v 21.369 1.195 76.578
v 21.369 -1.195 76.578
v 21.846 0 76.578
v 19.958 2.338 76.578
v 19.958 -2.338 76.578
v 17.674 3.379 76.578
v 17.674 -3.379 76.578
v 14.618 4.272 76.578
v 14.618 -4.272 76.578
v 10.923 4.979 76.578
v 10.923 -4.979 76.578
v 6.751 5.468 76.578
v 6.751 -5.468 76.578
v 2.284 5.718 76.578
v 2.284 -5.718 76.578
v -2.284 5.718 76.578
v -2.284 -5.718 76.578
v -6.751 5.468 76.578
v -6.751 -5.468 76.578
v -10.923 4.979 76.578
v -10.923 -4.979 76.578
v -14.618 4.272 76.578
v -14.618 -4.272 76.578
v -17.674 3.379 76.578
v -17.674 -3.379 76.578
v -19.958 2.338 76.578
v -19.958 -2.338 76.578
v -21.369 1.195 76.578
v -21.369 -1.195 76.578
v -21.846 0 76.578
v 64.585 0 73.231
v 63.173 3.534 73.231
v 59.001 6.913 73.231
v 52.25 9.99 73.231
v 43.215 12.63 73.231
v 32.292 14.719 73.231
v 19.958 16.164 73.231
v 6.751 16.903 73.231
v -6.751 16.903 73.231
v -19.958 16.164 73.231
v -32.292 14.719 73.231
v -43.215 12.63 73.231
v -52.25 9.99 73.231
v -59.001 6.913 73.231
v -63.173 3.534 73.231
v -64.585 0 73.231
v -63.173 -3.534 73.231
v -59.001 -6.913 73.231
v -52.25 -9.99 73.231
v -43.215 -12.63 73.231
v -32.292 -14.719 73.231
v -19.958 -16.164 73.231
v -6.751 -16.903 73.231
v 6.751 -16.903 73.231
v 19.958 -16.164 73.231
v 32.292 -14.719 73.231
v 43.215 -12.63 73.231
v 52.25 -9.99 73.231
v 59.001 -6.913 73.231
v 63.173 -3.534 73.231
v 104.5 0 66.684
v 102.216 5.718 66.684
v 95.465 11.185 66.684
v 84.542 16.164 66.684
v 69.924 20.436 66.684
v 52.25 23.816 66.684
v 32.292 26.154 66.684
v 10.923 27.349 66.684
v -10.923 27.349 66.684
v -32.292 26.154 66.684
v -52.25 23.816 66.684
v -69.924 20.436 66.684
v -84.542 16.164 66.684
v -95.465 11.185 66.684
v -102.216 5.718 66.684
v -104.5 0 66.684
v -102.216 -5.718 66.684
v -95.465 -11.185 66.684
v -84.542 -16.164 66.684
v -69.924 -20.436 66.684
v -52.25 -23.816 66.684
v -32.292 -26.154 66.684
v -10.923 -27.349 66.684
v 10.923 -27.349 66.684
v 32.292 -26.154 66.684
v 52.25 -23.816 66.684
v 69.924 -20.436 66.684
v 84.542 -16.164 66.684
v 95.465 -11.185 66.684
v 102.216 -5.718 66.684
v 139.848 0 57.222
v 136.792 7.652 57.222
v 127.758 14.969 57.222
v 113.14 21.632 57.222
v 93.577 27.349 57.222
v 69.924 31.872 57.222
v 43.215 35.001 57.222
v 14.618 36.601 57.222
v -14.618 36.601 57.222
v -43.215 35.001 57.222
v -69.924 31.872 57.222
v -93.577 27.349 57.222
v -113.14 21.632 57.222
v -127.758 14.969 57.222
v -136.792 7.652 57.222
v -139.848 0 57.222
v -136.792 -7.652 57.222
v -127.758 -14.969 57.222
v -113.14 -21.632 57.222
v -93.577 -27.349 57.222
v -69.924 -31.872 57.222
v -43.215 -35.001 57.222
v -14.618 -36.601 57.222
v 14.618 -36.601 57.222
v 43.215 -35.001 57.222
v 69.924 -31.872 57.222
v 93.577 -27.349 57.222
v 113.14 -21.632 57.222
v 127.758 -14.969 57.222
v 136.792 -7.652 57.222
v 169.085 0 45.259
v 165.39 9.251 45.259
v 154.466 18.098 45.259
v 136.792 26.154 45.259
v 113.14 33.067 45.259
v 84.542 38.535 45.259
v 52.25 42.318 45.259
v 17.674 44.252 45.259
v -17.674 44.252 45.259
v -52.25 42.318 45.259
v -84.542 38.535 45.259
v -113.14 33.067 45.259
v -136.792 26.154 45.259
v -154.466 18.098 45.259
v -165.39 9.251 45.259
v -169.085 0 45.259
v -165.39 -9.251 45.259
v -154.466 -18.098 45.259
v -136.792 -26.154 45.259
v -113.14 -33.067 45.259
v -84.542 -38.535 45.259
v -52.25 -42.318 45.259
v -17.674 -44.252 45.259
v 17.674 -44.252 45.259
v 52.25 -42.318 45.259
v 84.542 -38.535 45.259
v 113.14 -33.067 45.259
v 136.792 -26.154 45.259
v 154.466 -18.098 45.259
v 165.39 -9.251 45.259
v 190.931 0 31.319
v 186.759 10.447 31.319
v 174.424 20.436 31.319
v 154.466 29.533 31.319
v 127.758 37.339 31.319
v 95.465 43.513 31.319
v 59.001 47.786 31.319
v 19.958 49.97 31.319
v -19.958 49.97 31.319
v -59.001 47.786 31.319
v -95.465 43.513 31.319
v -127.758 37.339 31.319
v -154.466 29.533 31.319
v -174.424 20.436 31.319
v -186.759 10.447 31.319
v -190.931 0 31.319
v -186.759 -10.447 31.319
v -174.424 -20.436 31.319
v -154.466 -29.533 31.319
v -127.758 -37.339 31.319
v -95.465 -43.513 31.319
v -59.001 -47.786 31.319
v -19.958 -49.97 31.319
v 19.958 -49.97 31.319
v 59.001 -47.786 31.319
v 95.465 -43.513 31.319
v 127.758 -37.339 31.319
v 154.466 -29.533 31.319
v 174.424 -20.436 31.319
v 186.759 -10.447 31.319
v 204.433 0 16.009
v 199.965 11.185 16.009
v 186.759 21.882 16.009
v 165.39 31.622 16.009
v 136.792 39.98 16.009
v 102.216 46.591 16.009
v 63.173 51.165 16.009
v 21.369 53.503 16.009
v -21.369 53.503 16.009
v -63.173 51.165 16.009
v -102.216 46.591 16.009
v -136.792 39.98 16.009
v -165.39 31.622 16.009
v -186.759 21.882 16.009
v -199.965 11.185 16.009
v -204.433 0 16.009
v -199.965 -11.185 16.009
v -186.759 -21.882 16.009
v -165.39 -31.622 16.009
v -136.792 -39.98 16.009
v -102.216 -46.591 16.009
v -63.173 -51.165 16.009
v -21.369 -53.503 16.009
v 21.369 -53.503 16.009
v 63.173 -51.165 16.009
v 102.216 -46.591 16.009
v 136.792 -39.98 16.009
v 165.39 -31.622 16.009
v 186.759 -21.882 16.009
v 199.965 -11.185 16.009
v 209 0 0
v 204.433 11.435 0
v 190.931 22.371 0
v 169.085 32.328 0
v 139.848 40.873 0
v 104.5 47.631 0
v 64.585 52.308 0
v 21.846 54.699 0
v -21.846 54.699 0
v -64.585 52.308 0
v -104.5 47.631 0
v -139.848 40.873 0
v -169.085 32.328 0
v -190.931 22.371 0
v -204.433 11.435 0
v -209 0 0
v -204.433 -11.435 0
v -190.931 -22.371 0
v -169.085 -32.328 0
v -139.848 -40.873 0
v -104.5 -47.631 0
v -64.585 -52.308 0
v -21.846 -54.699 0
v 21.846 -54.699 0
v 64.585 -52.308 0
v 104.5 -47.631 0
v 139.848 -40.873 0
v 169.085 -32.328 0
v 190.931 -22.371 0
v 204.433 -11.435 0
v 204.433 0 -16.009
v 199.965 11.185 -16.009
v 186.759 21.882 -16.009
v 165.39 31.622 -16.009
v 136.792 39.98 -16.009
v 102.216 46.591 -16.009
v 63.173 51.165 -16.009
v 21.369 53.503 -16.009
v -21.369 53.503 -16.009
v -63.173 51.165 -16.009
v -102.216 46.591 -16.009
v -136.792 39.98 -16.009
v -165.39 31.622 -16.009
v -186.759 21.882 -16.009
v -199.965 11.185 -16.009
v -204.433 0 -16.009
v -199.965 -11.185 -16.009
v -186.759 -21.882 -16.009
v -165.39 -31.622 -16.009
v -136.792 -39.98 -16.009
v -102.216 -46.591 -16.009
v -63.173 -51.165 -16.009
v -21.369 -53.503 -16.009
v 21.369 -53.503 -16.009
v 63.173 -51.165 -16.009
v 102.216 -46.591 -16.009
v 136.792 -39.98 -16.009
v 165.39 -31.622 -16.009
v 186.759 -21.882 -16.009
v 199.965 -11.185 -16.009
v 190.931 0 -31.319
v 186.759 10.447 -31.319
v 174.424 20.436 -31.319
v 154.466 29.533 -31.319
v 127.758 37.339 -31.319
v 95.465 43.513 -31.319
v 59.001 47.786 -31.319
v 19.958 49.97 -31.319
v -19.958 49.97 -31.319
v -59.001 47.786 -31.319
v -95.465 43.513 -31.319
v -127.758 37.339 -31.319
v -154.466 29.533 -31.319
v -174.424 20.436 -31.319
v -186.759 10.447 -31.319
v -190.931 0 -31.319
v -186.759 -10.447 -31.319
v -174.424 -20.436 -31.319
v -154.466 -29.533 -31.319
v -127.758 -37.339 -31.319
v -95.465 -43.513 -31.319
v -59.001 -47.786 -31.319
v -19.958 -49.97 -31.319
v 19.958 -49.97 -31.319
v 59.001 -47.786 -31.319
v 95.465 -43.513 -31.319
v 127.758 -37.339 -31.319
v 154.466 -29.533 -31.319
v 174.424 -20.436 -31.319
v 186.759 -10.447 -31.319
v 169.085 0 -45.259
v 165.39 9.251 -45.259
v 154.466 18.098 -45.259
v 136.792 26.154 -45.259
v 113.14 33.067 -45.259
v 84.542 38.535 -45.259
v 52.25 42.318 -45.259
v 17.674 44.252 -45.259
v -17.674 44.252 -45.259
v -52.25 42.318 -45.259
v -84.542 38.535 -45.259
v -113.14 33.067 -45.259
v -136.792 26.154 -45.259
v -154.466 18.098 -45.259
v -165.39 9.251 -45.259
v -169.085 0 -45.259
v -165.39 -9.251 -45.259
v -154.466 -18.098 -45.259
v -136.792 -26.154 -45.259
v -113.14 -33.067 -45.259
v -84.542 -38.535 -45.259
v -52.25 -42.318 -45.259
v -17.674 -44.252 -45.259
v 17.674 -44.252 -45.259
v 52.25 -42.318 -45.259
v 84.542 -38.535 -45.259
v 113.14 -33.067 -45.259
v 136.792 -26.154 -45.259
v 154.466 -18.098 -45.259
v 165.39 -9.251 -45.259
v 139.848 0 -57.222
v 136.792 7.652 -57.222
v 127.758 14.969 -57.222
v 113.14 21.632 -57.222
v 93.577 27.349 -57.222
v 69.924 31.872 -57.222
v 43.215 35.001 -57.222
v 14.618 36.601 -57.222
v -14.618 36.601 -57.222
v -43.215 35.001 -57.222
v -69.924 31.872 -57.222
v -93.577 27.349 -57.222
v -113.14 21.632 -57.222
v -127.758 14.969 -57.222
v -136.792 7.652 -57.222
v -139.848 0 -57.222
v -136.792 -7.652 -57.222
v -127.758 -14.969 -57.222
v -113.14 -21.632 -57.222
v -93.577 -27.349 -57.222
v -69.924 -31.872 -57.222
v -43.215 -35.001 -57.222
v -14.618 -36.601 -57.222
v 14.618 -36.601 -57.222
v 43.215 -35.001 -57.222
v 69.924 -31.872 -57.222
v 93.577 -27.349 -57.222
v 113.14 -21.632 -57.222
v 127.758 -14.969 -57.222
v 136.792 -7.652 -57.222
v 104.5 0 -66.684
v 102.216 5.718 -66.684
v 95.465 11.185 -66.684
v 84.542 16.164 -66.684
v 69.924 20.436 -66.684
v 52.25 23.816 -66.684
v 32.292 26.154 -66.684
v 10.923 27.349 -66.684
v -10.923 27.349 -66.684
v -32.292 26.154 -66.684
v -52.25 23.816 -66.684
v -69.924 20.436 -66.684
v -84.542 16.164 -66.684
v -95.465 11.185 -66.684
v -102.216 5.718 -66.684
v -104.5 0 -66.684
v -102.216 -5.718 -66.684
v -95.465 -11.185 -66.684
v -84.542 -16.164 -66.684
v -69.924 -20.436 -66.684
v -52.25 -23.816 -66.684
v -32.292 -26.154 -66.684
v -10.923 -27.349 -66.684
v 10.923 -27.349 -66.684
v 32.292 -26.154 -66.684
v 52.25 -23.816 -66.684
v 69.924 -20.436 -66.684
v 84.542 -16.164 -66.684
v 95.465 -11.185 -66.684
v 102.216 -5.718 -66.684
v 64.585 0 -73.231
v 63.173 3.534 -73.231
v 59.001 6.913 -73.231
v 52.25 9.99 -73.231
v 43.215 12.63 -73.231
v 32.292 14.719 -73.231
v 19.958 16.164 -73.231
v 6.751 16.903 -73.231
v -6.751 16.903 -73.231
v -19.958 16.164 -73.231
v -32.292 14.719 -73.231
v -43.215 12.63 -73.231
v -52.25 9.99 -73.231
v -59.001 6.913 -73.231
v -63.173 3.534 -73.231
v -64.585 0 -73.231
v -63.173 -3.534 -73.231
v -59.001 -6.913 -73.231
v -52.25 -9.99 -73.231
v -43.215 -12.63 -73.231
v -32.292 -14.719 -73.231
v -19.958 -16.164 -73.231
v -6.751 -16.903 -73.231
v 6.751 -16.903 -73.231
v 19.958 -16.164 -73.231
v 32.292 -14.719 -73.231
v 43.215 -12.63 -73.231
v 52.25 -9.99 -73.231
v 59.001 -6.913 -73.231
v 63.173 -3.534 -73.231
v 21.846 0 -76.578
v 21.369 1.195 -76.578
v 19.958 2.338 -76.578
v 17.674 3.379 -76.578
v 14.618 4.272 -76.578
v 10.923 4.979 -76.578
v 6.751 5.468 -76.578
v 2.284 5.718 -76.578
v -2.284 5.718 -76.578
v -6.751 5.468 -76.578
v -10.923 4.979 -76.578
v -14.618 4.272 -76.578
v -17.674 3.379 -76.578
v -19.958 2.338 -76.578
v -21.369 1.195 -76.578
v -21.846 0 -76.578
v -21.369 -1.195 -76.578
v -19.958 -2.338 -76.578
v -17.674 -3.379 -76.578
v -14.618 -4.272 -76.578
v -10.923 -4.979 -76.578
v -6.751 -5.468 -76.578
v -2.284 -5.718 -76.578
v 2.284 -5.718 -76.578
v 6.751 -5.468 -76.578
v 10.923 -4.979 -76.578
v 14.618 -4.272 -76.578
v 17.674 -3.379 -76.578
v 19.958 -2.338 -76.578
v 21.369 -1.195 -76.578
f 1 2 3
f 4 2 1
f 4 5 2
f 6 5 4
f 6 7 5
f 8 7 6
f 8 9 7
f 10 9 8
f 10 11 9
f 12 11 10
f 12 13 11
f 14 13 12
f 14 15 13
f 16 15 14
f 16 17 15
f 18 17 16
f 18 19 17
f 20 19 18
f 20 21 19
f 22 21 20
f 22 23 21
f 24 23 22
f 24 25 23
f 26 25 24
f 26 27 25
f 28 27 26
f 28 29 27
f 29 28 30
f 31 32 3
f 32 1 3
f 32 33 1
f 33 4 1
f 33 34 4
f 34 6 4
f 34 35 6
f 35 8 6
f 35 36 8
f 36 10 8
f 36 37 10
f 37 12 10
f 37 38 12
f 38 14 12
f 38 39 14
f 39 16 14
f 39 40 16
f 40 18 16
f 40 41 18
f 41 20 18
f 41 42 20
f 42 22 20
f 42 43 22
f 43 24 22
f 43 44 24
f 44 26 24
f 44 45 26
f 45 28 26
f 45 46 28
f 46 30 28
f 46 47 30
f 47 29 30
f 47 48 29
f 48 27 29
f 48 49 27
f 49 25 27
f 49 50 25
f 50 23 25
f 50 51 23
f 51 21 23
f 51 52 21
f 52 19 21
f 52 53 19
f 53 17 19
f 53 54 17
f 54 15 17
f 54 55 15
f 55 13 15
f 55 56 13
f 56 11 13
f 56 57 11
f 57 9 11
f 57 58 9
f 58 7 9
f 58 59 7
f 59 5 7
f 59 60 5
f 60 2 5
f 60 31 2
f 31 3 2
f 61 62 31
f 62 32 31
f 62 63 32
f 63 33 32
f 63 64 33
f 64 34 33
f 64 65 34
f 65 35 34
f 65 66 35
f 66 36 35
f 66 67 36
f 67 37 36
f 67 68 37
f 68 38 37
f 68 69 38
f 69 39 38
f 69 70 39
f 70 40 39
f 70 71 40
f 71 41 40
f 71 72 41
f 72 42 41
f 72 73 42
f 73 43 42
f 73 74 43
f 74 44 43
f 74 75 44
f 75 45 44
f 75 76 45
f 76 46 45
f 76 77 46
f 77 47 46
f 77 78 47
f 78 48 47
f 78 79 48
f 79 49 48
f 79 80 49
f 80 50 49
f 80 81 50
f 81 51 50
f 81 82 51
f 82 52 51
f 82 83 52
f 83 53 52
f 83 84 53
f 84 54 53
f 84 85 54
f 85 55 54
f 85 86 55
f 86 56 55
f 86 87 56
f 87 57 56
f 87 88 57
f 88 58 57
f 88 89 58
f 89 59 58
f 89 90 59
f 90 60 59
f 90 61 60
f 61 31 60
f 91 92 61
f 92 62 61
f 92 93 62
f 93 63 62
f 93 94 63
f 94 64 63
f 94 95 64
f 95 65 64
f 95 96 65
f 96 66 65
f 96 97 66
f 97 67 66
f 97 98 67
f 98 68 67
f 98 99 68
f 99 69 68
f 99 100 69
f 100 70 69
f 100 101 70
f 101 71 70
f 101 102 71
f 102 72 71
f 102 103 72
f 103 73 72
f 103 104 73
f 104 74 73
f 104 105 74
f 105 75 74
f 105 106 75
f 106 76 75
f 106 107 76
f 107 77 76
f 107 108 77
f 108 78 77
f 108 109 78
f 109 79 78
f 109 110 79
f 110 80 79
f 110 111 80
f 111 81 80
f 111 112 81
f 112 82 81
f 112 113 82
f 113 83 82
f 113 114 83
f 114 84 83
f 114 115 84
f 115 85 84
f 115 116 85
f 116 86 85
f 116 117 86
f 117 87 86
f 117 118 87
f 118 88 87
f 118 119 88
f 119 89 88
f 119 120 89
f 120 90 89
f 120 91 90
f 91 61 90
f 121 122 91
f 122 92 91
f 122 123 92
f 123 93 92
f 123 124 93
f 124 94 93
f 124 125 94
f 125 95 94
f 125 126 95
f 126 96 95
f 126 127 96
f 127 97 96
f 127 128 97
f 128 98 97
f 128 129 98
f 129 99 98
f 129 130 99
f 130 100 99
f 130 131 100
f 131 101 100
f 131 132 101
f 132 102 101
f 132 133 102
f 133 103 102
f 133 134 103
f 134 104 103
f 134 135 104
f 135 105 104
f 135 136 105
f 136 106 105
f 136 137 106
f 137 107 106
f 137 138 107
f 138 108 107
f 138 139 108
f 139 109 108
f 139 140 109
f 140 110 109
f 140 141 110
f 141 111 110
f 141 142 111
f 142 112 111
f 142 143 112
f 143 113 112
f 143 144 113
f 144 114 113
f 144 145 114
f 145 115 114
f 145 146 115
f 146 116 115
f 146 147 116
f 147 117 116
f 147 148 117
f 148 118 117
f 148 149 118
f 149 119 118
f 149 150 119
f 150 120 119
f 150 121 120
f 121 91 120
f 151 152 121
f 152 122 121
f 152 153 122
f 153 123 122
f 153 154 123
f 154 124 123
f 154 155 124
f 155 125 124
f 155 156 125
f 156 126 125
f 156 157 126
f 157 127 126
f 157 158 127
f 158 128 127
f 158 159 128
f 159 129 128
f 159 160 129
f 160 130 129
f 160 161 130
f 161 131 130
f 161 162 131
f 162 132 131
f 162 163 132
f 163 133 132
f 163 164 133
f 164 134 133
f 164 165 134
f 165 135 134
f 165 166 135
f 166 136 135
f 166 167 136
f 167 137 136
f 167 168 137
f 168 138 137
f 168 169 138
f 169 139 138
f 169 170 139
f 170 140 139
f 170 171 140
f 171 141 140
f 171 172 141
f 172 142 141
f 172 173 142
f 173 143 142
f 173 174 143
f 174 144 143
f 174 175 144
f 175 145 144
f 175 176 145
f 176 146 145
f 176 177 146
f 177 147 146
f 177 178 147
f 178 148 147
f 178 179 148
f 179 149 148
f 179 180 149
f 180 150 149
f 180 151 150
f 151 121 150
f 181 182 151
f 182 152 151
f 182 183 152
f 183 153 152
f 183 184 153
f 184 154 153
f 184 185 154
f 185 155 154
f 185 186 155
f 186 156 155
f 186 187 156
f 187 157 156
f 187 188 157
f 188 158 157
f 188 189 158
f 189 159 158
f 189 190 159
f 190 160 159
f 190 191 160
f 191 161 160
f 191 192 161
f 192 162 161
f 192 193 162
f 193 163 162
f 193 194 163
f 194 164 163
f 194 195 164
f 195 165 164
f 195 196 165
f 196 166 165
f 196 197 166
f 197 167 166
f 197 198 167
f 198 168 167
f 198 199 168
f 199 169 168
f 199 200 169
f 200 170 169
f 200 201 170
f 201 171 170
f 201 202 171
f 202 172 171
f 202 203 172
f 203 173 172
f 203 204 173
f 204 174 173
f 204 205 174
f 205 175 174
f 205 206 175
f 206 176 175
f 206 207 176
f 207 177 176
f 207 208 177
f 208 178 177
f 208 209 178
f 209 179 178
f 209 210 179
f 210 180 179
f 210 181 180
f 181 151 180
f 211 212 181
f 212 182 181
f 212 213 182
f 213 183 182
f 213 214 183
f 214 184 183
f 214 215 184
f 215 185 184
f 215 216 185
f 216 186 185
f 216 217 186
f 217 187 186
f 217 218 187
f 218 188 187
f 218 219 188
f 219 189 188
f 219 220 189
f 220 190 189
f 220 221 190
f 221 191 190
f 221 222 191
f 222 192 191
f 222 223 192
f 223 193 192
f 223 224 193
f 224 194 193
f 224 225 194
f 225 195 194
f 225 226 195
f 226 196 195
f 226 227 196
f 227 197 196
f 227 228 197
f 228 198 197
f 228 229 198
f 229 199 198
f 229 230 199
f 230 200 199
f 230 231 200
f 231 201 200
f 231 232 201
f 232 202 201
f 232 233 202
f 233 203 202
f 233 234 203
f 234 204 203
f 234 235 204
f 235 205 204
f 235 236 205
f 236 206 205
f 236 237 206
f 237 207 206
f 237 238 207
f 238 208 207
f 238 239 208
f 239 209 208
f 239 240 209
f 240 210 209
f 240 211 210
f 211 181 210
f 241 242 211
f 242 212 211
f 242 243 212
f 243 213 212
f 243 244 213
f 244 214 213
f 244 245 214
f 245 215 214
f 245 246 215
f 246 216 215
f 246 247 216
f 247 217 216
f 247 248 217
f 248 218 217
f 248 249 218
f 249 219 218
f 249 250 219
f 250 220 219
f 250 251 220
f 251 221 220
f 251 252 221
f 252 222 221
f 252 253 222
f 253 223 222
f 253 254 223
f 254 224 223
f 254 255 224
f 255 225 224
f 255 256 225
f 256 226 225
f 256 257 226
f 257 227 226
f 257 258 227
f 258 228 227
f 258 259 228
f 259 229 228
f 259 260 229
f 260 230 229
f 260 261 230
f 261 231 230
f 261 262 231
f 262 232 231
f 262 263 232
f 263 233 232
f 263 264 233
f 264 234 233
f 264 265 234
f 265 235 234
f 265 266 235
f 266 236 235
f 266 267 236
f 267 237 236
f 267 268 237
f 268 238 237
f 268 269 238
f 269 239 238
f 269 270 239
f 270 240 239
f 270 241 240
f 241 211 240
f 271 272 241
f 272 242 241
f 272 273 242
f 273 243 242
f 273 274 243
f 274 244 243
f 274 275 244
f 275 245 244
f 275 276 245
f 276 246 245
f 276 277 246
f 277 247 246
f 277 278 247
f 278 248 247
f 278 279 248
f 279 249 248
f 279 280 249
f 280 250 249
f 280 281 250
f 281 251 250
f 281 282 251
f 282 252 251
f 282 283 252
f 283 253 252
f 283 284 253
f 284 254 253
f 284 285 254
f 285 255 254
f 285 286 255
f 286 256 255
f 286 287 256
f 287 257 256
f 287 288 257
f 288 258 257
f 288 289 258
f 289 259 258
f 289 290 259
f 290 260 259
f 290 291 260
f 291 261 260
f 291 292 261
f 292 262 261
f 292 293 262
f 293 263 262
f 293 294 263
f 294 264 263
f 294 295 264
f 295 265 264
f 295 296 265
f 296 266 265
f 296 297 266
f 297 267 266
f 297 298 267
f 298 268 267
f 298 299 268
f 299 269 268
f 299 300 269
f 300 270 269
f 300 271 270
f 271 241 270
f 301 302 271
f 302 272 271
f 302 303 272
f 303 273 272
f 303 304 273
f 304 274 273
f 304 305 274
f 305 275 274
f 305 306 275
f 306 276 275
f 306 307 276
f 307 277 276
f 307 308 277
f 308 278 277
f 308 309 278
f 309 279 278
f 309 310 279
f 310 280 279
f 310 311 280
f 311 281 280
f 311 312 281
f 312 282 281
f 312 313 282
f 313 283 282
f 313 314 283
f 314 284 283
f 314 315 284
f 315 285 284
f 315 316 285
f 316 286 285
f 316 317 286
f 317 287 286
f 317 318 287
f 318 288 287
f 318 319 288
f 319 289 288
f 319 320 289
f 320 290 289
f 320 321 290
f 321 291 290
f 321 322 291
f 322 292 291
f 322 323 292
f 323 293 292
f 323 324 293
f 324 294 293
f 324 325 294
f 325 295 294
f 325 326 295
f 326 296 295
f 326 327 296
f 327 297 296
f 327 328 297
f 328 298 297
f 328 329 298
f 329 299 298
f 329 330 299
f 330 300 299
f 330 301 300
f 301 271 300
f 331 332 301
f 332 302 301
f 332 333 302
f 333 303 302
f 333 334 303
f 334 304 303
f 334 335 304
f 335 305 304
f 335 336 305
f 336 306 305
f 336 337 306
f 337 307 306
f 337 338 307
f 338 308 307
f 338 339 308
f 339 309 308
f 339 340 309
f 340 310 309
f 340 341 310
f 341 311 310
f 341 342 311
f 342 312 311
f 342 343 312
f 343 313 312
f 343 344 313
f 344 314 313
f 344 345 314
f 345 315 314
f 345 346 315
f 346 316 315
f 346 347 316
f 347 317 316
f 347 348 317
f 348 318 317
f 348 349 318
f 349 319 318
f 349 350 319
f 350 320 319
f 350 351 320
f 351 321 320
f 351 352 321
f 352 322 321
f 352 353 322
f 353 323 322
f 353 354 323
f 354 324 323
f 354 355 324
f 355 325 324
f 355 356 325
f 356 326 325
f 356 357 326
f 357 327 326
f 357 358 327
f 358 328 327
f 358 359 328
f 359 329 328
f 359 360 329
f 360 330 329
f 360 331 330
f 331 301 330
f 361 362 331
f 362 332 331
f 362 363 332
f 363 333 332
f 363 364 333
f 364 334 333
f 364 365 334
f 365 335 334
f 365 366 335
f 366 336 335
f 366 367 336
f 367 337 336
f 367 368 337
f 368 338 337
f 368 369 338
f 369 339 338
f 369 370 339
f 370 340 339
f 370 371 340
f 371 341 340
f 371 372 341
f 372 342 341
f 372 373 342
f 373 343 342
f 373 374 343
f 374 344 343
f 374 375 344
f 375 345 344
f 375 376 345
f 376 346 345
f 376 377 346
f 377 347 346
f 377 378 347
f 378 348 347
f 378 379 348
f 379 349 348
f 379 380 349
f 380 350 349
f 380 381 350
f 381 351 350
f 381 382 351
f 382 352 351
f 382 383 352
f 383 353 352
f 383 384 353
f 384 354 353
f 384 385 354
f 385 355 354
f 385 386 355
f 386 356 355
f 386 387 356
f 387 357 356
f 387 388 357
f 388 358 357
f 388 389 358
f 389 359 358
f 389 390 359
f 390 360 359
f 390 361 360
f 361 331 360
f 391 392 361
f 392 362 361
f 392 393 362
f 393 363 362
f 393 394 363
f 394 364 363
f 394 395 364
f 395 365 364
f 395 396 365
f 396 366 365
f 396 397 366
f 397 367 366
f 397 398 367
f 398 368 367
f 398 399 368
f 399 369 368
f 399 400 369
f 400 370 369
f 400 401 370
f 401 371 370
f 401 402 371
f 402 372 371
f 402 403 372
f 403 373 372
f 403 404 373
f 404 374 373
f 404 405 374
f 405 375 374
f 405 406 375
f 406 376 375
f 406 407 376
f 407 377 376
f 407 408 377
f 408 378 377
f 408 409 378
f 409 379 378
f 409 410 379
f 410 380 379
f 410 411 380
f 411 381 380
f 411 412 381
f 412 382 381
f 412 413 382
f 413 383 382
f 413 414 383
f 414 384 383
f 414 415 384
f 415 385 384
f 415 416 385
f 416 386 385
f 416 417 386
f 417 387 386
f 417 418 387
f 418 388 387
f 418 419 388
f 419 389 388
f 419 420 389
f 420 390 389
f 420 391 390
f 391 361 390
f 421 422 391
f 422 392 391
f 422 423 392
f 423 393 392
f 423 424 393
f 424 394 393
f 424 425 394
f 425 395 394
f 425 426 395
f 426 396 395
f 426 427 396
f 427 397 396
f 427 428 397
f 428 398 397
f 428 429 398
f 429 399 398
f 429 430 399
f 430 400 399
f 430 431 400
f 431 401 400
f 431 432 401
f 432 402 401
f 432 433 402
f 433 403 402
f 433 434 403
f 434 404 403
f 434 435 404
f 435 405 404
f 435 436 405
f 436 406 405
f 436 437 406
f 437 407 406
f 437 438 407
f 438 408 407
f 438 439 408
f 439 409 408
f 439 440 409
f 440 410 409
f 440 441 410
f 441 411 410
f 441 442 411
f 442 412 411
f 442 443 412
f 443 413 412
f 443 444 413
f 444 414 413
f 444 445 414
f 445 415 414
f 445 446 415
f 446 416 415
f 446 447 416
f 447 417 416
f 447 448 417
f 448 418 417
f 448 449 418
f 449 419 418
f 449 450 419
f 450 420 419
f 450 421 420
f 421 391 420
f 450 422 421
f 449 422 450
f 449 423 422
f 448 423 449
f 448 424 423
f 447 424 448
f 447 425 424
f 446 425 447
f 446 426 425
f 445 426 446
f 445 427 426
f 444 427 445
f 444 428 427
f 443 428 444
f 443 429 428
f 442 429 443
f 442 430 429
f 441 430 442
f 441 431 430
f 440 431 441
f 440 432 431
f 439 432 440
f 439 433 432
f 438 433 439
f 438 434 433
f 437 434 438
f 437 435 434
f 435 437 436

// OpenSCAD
// Generated by SolidPython 1.0.1 on 2020-07-29 00:46:53


scale(v = [19, 5, 7]) {
	sphere(r = 11);
}
/***********************************************
*********      SolidPython code:      **********
************************************************
 
# import packages: SolidPython
from solid import *
from solid.utils import *
from itertools import chain, combinations, permutations


class Resize:

    def __init__(self, scad_file):
        self.scad_file = scad_file
        #self.scad_file = import_scad(scad_file)
        # cone/cylinder param:
        self.r1 = 0
        self.r2 = 0
        self.h = 0
        # rectangular prism param:
        self.w = 0
        self.l = 0
        # ellipse param:
        self.r = 0

    # import OpenScad code (file name corresponds to shape)


    # classify shape + parameters
    def assign(self, param1, param2, param3):
        if self.scad_file == 'cone.scad':
            self.r1 = param1
            self.r2 = param2
            self.h = param3
        elif self.scad_file == 'cylinder.scad':
            self.r1 = param1
            self.r2 = param2
            self.h = param3
        elif self.scad_file == 'rectangularPrism.scad':
            self.h = param1
            self.l = param2
            self.w = param3
        else:
            self.r = param1
            self.h = param2

    # resize parameters
    def iterate(self):
        x = range(3, 20, 2)
        i = 1
        if self.scad_file == 'cone.scad':
            tempList = list(permutations(x, 2))
            for temp in tempList:
                param1 = temp[0]
                param2 = temp[1]
                filepath = 'produced_scad_files/' + 'cone' + str(param1) + '_' + str(param2) + '_' + '.scad'
                scad_render_to_file(cylinder(h=param1, r1=param2, r2=0), filepath)

        elif self.scad_file == 'cylinder.scad':
            tempList = list(permutations(x, 3))
            for temp in tempList:
                param1 = temp[0]
                param2 = temp[1]
                filepath = 'produced_scad_files/' + 'cylinder' + str(param1) + '_' + str(param2) + '_' + '.scad'
                scad_render_to_file(cylinder(h=param1, r1=param2, r2=param2), filepath)

        elif self.scad_file == 'rectangularPrism.scad':
            tempList = list(permutations(x, 3))
            for temp in tempList:
                param1 = temp[0]
                param2 = temp[1]
                param3 = temp[2]
                filepath = 'produced_scad_files/' + 'rectangularPrism' + str(param1) + '_' + str(param2) + '_' + str(
                    param3) + '.scad'
                scad_render_to_file(cube(size=(param1, param2, param3)), filepath)

        elif self.scad_file == 'ellipse.scad':
            tempList = list(permutations(x, 4))
            for temp in tempList:
                param1 = temp[0]
                param2 = temp[1]
                param3 = temp[2]
                param4 = temp[3]
                filepath = 'produced_scad_files/' + 'ellipse' + str(param1) + '_' + str(param2) + '_' + str(param3) + '_' + str(param4) + '.scad'
                scad_render_to_file(scale([param1, param2, param3])(sphere(r=param4)), filepath)

    def render_to_scadfile(self):
        scad_render_to_file(scad, 'example.scad') 
 
************************************************/
